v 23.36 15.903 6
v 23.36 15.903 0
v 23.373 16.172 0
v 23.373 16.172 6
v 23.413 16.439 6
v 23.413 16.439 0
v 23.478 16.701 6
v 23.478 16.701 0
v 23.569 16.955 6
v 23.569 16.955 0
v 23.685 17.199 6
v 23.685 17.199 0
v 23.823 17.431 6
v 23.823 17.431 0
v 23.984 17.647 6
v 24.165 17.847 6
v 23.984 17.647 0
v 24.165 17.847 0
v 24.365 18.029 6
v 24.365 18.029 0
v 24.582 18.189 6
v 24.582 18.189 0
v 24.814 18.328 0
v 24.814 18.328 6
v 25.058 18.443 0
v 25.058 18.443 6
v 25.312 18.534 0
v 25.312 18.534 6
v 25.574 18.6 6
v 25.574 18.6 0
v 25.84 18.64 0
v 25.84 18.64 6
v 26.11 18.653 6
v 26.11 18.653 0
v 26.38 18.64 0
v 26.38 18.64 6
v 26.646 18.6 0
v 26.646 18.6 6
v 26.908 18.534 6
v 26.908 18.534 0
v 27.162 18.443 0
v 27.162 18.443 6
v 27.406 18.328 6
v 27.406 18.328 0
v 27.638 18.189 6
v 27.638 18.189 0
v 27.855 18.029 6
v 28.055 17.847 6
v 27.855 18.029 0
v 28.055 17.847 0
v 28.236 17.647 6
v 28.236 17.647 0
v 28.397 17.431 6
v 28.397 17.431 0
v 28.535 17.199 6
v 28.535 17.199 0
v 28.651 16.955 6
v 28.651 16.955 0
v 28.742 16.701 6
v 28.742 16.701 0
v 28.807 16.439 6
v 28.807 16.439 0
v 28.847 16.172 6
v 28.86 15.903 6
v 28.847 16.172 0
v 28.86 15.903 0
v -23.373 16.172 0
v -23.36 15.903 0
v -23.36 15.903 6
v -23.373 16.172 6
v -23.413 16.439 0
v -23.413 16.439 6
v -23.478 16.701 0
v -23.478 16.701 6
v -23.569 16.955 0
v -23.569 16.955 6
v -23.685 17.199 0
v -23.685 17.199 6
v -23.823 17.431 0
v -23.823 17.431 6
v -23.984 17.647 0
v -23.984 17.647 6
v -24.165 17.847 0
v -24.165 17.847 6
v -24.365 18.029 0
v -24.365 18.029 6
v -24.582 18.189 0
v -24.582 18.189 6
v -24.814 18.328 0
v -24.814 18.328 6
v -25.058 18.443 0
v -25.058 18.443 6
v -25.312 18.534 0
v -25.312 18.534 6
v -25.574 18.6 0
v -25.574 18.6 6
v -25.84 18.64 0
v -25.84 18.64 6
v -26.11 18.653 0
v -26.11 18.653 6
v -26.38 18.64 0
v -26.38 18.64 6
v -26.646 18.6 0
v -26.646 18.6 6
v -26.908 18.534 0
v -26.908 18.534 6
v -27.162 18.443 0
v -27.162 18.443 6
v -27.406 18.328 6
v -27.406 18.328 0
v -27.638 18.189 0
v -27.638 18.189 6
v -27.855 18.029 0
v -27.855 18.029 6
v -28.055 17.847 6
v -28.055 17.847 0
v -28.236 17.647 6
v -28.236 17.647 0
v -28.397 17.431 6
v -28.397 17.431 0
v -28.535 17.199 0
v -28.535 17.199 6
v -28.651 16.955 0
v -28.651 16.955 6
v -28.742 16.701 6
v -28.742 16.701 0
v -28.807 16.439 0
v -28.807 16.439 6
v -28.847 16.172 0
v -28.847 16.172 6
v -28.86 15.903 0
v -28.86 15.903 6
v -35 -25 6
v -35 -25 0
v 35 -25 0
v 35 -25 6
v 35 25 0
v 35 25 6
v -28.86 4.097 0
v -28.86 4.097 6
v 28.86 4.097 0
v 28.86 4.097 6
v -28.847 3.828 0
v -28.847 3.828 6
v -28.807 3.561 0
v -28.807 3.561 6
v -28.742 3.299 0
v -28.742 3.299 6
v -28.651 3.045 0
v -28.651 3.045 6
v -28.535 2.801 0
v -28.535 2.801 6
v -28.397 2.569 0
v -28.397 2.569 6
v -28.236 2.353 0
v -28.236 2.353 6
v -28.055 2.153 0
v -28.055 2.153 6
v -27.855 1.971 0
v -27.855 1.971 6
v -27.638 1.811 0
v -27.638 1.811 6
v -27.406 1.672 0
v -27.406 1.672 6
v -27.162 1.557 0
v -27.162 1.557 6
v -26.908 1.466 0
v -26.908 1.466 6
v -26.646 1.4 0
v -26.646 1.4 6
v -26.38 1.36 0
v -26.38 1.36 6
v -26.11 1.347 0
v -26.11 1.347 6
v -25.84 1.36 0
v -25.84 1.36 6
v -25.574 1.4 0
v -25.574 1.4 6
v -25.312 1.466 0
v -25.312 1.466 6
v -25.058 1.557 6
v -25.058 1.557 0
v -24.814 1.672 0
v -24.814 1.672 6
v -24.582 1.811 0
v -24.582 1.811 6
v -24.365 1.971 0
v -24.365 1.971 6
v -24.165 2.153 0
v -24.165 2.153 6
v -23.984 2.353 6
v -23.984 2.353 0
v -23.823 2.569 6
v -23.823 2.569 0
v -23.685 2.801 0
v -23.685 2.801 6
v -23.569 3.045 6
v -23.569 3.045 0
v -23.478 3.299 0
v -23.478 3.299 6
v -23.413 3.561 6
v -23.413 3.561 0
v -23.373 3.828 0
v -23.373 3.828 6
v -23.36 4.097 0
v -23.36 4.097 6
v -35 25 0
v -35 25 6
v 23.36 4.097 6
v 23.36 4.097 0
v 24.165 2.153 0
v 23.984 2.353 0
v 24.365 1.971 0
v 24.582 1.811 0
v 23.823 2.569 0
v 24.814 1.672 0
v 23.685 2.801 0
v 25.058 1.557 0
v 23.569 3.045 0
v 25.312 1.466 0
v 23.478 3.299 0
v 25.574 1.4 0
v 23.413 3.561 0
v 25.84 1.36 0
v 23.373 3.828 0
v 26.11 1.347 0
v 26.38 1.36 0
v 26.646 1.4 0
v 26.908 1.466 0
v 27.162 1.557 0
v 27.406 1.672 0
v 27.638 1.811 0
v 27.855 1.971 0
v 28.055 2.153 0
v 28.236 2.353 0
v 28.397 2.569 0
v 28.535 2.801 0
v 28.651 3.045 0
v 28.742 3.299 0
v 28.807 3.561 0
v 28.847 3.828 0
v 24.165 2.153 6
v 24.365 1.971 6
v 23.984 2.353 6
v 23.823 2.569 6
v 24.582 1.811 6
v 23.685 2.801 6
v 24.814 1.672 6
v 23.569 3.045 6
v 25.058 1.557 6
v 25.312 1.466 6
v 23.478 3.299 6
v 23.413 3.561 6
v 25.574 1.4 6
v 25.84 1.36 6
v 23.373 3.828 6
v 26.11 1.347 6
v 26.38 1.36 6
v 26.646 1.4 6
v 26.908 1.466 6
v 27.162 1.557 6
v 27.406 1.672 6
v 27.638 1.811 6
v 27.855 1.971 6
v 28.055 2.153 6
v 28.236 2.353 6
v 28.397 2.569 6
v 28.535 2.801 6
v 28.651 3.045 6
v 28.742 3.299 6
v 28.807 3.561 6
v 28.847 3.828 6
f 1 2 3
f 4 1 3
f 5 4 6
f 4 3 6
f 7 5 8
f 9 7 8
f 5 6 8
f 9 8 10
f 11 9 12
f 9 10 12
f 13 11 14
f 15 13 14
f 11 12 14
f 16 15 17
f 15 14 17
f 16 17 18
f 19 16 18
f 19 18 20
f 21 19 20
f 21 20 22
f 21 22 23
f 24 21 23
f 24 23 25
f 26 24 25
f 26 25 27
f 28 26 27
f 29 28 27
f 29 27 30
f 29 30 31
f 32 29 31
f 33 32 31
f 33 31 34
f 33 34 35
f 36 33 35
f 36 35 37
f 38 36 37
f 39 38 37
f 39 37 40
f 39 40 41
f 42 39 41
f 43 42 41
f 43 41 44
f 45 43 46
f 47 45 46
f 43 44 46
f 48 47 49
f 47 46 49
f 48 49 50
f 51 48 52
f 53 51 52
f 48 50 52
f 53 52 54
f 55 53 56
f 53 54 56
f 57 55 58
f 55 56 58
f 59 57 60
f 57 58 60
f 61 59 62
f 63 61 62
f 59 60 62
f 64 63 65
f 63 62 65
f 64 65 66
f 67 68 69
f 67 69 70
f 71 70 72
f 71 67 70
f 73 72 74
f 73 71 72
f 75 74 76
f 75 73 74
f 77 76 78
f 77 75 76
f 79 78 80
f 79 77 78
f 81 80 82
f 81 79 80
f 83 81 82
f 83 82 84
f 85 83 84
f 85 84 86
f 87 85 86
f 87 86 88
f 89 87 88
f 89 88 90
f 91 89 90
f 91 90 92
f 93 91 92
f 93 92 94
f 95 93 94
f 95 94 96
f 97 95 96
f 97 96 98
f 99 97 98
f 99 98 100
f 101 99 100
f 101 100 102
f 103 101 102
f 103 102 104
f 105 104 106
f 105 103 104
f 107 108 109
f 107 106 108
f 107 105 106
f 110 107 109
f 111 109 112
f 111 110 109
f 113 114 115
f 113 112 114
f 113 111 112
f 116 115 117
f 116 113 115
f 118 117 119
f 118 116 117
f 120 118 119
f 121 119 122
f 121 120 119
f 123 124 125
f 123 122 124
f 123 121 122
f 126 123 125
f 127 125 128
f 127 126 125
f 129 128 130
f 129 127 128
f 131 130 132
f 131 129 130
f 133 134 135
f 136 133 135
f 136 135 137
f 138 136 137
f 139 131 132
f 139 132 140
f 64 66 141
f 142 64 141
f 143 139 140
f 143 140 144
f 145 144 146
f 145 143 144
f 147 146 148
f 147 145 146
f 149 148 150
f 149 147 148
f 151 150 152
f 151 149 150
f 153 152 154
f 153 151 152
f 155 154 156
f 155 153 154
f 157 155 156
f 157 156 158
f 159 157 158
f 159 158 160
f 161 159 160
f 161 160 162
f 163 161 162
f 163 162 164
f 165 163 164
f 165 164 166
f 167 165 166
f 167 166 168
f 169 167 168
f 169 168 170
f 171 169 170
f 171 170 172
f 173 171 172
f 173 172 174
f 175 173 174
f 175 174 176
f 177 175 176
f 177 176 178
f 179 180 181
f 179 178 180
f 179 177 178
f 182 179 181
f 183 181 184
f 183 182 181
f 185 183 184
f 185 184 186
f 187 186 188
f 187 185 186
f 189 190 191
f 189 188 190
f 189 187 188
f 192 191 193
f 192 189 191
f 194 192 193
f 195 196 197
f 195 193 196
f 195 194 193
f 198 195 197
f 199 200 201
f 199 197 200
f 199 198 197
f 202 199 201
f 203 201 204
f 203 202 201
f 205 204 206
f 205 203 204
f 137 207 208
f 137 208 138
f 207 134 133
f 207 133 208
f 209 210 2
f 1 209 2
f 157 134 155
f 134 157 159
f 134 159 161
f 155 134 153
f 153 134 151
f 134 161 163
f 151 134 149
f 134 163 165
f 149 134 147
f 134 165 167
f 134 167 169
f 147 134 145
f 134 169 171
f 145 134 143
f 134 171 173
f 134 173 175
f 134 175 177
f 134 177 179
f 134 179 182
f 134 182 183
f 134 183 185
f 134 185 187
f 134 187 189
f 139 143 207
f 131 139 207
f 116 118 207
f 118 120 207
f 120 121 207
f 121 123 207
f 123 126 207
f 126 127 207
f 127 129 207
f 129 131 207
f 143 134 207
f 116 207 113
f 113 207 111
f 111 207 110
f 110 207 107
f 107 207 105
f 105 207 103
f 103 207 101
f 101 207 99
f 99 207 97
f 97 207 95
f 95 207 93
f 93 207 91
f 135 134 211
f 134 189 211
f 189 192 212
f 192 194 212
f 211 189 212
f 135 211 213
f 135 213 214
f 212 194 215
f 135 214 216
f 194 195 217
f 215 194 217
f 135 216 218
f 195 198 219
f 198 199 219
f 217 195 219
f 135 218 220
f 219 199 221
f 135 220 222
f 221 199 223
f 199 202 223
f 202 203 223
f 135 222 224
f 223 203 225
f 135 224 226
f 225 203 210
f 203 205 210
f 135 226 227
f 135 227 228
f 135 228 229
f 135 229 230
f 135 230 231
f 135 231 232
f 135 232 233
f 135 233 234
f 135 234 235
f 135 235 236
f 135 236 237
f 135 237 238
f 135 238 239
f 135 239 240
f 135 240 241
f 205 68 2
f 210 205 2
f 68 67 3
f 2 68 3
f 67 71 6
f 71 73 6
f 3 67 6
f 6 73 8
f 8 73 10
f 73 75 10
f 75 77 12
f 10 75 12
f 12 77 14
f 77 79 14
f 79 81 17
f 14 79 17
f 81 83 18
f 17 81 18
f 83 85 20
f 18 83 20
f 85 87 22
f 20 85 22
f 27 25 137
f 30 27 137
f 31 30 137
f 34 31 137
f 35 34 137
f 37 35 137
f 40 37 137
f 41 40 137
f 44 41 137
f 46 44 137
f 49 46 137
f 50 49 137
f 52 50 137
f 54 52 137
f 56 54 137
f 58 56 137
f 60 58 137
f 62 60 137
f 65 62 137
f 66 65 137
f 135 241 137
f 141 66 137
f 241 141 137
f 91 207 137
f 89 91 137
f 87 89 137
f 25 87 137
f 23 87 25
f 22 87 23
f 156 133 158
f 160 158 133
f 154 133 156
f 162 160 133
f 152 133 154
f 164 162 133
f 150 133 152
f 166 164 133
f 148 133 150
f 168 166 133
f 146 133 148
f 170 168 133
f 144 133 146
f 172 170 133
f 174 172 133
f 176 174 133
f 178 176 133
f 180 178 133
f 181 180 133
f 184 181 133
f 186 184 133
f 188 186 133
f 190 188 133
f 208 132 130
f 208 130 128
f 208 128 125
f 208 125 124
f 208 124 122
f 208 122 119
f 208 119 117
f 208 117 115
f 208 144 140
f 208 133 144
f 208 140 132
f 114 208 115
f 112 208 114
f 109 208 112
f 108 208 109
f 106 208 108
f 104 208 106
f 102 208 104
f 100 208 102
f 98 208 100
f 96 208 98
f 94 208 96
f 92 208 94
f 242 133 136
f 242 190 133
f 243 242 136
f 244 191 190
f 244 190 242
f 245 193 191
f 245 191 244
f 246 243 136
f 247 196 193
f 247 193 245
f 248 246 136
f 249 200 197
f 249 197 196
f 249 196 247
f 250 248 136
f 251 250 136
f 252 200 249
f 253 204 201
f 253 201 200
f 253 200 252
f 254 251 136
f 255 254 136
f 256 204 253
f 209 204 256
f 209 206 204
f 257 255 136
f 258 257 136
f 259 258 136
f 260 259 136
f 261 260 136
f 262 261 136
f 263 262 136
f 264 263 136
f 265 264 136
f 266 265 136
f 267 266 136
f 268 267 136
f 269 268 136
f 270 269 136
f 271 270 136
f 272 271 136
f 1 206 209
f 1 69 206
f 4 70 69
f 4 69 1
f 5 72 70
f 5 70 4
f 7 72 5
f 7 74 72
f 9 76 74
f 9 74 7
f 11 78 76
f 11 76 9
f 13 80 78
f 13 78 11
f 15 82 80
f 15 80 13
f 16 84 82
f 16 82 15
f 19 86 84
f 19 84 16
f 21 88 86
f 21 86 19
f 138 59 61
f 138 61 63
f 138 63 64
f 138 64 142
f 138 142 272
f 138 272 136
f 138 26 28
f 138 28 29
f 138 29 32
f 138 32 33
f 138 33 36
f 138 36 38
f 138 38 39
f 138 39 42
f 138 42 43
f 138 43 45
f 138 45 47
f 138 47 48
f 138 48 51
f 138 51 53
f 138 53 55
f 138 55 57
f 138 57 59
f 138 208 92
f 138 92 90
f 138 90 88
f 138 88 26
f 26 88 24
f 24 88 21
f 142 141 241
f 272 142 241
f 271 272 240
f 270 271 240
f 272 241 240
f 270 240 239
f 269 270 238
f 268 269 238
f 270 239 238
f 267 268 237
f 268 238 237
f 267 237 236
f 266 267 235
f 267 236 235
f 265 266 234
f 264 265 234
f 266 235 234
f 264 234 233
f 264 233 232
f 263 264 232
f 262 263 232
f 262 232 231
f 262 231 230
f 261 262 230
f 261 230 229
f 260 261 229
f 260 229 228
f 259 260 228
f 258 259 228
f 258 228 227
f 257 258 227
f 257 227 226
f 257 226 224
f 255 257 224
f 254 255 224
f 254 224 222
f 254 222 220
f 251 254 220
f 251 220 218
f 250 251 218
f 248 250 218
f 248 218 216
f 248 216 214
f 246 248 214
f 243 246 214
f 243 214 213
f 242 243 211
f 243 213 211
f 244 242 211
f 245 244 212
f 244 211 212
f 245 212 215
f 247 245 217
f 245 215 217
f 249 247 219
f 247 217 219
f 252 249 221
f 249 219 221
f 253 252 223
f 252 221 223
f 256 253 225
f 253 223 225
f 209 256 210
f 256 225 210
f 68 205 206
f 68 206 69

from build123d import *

# Parameters (mm, degrees)
SKETCH1_W           = 70
SKETCH1_H           = 50
BOSS_EXTRUDE1_DEPTH = 6
CUT_EXTRUDE1_DEPTH  = 44.428101501


with BuildPart() as part:
    # Sketch1 → Boss-Extrude1 (new body)
    with BuildSketch(Plane.XY):
        Rectangle(SKETCH1_W, SKETCH1_H)
    extrude(amount=BOSS_EXTRUDE1_DEPTH)

    # Sketch2 → Cut-Extrude1 (cut, through all)
    with BuildSketch(Plane.XY):
        with BuildLine():
            Line((23.36, 4.097243552), (23.36, 15.902756448))
            ThreePointArc((23.36, 15.902756448), (26.11, 18.652756448), (28.86, 15.902756448))
            Line((28.86, 15.902756448), (28.86, 4.097243552))
            ThreePointArc((28.86, 4.097243552), (26.11, 1.347243552), (23.36, 4.097243552))
        make_face()
        with BuildLine():
            Line((-23.36, 4.097243552), (-23.36, 15.902756448))
            ThreePointArc((-23.36, 15.902756448), (-26.11, 18.652756448), (-28.86, 15.902756448))
            Line((-28.86, 15.902756448), (-28.86, 4.097243552))
            ThreePointArc((-28.86, 4.097243552), (-26.11, 1.347243552), (-23.36, 4.097243552))
        make_face()
    extrude(amount=CUT_EXTRUDE1_DEPTH, mode=Mode.SUBTRACT)


solid = part.part
